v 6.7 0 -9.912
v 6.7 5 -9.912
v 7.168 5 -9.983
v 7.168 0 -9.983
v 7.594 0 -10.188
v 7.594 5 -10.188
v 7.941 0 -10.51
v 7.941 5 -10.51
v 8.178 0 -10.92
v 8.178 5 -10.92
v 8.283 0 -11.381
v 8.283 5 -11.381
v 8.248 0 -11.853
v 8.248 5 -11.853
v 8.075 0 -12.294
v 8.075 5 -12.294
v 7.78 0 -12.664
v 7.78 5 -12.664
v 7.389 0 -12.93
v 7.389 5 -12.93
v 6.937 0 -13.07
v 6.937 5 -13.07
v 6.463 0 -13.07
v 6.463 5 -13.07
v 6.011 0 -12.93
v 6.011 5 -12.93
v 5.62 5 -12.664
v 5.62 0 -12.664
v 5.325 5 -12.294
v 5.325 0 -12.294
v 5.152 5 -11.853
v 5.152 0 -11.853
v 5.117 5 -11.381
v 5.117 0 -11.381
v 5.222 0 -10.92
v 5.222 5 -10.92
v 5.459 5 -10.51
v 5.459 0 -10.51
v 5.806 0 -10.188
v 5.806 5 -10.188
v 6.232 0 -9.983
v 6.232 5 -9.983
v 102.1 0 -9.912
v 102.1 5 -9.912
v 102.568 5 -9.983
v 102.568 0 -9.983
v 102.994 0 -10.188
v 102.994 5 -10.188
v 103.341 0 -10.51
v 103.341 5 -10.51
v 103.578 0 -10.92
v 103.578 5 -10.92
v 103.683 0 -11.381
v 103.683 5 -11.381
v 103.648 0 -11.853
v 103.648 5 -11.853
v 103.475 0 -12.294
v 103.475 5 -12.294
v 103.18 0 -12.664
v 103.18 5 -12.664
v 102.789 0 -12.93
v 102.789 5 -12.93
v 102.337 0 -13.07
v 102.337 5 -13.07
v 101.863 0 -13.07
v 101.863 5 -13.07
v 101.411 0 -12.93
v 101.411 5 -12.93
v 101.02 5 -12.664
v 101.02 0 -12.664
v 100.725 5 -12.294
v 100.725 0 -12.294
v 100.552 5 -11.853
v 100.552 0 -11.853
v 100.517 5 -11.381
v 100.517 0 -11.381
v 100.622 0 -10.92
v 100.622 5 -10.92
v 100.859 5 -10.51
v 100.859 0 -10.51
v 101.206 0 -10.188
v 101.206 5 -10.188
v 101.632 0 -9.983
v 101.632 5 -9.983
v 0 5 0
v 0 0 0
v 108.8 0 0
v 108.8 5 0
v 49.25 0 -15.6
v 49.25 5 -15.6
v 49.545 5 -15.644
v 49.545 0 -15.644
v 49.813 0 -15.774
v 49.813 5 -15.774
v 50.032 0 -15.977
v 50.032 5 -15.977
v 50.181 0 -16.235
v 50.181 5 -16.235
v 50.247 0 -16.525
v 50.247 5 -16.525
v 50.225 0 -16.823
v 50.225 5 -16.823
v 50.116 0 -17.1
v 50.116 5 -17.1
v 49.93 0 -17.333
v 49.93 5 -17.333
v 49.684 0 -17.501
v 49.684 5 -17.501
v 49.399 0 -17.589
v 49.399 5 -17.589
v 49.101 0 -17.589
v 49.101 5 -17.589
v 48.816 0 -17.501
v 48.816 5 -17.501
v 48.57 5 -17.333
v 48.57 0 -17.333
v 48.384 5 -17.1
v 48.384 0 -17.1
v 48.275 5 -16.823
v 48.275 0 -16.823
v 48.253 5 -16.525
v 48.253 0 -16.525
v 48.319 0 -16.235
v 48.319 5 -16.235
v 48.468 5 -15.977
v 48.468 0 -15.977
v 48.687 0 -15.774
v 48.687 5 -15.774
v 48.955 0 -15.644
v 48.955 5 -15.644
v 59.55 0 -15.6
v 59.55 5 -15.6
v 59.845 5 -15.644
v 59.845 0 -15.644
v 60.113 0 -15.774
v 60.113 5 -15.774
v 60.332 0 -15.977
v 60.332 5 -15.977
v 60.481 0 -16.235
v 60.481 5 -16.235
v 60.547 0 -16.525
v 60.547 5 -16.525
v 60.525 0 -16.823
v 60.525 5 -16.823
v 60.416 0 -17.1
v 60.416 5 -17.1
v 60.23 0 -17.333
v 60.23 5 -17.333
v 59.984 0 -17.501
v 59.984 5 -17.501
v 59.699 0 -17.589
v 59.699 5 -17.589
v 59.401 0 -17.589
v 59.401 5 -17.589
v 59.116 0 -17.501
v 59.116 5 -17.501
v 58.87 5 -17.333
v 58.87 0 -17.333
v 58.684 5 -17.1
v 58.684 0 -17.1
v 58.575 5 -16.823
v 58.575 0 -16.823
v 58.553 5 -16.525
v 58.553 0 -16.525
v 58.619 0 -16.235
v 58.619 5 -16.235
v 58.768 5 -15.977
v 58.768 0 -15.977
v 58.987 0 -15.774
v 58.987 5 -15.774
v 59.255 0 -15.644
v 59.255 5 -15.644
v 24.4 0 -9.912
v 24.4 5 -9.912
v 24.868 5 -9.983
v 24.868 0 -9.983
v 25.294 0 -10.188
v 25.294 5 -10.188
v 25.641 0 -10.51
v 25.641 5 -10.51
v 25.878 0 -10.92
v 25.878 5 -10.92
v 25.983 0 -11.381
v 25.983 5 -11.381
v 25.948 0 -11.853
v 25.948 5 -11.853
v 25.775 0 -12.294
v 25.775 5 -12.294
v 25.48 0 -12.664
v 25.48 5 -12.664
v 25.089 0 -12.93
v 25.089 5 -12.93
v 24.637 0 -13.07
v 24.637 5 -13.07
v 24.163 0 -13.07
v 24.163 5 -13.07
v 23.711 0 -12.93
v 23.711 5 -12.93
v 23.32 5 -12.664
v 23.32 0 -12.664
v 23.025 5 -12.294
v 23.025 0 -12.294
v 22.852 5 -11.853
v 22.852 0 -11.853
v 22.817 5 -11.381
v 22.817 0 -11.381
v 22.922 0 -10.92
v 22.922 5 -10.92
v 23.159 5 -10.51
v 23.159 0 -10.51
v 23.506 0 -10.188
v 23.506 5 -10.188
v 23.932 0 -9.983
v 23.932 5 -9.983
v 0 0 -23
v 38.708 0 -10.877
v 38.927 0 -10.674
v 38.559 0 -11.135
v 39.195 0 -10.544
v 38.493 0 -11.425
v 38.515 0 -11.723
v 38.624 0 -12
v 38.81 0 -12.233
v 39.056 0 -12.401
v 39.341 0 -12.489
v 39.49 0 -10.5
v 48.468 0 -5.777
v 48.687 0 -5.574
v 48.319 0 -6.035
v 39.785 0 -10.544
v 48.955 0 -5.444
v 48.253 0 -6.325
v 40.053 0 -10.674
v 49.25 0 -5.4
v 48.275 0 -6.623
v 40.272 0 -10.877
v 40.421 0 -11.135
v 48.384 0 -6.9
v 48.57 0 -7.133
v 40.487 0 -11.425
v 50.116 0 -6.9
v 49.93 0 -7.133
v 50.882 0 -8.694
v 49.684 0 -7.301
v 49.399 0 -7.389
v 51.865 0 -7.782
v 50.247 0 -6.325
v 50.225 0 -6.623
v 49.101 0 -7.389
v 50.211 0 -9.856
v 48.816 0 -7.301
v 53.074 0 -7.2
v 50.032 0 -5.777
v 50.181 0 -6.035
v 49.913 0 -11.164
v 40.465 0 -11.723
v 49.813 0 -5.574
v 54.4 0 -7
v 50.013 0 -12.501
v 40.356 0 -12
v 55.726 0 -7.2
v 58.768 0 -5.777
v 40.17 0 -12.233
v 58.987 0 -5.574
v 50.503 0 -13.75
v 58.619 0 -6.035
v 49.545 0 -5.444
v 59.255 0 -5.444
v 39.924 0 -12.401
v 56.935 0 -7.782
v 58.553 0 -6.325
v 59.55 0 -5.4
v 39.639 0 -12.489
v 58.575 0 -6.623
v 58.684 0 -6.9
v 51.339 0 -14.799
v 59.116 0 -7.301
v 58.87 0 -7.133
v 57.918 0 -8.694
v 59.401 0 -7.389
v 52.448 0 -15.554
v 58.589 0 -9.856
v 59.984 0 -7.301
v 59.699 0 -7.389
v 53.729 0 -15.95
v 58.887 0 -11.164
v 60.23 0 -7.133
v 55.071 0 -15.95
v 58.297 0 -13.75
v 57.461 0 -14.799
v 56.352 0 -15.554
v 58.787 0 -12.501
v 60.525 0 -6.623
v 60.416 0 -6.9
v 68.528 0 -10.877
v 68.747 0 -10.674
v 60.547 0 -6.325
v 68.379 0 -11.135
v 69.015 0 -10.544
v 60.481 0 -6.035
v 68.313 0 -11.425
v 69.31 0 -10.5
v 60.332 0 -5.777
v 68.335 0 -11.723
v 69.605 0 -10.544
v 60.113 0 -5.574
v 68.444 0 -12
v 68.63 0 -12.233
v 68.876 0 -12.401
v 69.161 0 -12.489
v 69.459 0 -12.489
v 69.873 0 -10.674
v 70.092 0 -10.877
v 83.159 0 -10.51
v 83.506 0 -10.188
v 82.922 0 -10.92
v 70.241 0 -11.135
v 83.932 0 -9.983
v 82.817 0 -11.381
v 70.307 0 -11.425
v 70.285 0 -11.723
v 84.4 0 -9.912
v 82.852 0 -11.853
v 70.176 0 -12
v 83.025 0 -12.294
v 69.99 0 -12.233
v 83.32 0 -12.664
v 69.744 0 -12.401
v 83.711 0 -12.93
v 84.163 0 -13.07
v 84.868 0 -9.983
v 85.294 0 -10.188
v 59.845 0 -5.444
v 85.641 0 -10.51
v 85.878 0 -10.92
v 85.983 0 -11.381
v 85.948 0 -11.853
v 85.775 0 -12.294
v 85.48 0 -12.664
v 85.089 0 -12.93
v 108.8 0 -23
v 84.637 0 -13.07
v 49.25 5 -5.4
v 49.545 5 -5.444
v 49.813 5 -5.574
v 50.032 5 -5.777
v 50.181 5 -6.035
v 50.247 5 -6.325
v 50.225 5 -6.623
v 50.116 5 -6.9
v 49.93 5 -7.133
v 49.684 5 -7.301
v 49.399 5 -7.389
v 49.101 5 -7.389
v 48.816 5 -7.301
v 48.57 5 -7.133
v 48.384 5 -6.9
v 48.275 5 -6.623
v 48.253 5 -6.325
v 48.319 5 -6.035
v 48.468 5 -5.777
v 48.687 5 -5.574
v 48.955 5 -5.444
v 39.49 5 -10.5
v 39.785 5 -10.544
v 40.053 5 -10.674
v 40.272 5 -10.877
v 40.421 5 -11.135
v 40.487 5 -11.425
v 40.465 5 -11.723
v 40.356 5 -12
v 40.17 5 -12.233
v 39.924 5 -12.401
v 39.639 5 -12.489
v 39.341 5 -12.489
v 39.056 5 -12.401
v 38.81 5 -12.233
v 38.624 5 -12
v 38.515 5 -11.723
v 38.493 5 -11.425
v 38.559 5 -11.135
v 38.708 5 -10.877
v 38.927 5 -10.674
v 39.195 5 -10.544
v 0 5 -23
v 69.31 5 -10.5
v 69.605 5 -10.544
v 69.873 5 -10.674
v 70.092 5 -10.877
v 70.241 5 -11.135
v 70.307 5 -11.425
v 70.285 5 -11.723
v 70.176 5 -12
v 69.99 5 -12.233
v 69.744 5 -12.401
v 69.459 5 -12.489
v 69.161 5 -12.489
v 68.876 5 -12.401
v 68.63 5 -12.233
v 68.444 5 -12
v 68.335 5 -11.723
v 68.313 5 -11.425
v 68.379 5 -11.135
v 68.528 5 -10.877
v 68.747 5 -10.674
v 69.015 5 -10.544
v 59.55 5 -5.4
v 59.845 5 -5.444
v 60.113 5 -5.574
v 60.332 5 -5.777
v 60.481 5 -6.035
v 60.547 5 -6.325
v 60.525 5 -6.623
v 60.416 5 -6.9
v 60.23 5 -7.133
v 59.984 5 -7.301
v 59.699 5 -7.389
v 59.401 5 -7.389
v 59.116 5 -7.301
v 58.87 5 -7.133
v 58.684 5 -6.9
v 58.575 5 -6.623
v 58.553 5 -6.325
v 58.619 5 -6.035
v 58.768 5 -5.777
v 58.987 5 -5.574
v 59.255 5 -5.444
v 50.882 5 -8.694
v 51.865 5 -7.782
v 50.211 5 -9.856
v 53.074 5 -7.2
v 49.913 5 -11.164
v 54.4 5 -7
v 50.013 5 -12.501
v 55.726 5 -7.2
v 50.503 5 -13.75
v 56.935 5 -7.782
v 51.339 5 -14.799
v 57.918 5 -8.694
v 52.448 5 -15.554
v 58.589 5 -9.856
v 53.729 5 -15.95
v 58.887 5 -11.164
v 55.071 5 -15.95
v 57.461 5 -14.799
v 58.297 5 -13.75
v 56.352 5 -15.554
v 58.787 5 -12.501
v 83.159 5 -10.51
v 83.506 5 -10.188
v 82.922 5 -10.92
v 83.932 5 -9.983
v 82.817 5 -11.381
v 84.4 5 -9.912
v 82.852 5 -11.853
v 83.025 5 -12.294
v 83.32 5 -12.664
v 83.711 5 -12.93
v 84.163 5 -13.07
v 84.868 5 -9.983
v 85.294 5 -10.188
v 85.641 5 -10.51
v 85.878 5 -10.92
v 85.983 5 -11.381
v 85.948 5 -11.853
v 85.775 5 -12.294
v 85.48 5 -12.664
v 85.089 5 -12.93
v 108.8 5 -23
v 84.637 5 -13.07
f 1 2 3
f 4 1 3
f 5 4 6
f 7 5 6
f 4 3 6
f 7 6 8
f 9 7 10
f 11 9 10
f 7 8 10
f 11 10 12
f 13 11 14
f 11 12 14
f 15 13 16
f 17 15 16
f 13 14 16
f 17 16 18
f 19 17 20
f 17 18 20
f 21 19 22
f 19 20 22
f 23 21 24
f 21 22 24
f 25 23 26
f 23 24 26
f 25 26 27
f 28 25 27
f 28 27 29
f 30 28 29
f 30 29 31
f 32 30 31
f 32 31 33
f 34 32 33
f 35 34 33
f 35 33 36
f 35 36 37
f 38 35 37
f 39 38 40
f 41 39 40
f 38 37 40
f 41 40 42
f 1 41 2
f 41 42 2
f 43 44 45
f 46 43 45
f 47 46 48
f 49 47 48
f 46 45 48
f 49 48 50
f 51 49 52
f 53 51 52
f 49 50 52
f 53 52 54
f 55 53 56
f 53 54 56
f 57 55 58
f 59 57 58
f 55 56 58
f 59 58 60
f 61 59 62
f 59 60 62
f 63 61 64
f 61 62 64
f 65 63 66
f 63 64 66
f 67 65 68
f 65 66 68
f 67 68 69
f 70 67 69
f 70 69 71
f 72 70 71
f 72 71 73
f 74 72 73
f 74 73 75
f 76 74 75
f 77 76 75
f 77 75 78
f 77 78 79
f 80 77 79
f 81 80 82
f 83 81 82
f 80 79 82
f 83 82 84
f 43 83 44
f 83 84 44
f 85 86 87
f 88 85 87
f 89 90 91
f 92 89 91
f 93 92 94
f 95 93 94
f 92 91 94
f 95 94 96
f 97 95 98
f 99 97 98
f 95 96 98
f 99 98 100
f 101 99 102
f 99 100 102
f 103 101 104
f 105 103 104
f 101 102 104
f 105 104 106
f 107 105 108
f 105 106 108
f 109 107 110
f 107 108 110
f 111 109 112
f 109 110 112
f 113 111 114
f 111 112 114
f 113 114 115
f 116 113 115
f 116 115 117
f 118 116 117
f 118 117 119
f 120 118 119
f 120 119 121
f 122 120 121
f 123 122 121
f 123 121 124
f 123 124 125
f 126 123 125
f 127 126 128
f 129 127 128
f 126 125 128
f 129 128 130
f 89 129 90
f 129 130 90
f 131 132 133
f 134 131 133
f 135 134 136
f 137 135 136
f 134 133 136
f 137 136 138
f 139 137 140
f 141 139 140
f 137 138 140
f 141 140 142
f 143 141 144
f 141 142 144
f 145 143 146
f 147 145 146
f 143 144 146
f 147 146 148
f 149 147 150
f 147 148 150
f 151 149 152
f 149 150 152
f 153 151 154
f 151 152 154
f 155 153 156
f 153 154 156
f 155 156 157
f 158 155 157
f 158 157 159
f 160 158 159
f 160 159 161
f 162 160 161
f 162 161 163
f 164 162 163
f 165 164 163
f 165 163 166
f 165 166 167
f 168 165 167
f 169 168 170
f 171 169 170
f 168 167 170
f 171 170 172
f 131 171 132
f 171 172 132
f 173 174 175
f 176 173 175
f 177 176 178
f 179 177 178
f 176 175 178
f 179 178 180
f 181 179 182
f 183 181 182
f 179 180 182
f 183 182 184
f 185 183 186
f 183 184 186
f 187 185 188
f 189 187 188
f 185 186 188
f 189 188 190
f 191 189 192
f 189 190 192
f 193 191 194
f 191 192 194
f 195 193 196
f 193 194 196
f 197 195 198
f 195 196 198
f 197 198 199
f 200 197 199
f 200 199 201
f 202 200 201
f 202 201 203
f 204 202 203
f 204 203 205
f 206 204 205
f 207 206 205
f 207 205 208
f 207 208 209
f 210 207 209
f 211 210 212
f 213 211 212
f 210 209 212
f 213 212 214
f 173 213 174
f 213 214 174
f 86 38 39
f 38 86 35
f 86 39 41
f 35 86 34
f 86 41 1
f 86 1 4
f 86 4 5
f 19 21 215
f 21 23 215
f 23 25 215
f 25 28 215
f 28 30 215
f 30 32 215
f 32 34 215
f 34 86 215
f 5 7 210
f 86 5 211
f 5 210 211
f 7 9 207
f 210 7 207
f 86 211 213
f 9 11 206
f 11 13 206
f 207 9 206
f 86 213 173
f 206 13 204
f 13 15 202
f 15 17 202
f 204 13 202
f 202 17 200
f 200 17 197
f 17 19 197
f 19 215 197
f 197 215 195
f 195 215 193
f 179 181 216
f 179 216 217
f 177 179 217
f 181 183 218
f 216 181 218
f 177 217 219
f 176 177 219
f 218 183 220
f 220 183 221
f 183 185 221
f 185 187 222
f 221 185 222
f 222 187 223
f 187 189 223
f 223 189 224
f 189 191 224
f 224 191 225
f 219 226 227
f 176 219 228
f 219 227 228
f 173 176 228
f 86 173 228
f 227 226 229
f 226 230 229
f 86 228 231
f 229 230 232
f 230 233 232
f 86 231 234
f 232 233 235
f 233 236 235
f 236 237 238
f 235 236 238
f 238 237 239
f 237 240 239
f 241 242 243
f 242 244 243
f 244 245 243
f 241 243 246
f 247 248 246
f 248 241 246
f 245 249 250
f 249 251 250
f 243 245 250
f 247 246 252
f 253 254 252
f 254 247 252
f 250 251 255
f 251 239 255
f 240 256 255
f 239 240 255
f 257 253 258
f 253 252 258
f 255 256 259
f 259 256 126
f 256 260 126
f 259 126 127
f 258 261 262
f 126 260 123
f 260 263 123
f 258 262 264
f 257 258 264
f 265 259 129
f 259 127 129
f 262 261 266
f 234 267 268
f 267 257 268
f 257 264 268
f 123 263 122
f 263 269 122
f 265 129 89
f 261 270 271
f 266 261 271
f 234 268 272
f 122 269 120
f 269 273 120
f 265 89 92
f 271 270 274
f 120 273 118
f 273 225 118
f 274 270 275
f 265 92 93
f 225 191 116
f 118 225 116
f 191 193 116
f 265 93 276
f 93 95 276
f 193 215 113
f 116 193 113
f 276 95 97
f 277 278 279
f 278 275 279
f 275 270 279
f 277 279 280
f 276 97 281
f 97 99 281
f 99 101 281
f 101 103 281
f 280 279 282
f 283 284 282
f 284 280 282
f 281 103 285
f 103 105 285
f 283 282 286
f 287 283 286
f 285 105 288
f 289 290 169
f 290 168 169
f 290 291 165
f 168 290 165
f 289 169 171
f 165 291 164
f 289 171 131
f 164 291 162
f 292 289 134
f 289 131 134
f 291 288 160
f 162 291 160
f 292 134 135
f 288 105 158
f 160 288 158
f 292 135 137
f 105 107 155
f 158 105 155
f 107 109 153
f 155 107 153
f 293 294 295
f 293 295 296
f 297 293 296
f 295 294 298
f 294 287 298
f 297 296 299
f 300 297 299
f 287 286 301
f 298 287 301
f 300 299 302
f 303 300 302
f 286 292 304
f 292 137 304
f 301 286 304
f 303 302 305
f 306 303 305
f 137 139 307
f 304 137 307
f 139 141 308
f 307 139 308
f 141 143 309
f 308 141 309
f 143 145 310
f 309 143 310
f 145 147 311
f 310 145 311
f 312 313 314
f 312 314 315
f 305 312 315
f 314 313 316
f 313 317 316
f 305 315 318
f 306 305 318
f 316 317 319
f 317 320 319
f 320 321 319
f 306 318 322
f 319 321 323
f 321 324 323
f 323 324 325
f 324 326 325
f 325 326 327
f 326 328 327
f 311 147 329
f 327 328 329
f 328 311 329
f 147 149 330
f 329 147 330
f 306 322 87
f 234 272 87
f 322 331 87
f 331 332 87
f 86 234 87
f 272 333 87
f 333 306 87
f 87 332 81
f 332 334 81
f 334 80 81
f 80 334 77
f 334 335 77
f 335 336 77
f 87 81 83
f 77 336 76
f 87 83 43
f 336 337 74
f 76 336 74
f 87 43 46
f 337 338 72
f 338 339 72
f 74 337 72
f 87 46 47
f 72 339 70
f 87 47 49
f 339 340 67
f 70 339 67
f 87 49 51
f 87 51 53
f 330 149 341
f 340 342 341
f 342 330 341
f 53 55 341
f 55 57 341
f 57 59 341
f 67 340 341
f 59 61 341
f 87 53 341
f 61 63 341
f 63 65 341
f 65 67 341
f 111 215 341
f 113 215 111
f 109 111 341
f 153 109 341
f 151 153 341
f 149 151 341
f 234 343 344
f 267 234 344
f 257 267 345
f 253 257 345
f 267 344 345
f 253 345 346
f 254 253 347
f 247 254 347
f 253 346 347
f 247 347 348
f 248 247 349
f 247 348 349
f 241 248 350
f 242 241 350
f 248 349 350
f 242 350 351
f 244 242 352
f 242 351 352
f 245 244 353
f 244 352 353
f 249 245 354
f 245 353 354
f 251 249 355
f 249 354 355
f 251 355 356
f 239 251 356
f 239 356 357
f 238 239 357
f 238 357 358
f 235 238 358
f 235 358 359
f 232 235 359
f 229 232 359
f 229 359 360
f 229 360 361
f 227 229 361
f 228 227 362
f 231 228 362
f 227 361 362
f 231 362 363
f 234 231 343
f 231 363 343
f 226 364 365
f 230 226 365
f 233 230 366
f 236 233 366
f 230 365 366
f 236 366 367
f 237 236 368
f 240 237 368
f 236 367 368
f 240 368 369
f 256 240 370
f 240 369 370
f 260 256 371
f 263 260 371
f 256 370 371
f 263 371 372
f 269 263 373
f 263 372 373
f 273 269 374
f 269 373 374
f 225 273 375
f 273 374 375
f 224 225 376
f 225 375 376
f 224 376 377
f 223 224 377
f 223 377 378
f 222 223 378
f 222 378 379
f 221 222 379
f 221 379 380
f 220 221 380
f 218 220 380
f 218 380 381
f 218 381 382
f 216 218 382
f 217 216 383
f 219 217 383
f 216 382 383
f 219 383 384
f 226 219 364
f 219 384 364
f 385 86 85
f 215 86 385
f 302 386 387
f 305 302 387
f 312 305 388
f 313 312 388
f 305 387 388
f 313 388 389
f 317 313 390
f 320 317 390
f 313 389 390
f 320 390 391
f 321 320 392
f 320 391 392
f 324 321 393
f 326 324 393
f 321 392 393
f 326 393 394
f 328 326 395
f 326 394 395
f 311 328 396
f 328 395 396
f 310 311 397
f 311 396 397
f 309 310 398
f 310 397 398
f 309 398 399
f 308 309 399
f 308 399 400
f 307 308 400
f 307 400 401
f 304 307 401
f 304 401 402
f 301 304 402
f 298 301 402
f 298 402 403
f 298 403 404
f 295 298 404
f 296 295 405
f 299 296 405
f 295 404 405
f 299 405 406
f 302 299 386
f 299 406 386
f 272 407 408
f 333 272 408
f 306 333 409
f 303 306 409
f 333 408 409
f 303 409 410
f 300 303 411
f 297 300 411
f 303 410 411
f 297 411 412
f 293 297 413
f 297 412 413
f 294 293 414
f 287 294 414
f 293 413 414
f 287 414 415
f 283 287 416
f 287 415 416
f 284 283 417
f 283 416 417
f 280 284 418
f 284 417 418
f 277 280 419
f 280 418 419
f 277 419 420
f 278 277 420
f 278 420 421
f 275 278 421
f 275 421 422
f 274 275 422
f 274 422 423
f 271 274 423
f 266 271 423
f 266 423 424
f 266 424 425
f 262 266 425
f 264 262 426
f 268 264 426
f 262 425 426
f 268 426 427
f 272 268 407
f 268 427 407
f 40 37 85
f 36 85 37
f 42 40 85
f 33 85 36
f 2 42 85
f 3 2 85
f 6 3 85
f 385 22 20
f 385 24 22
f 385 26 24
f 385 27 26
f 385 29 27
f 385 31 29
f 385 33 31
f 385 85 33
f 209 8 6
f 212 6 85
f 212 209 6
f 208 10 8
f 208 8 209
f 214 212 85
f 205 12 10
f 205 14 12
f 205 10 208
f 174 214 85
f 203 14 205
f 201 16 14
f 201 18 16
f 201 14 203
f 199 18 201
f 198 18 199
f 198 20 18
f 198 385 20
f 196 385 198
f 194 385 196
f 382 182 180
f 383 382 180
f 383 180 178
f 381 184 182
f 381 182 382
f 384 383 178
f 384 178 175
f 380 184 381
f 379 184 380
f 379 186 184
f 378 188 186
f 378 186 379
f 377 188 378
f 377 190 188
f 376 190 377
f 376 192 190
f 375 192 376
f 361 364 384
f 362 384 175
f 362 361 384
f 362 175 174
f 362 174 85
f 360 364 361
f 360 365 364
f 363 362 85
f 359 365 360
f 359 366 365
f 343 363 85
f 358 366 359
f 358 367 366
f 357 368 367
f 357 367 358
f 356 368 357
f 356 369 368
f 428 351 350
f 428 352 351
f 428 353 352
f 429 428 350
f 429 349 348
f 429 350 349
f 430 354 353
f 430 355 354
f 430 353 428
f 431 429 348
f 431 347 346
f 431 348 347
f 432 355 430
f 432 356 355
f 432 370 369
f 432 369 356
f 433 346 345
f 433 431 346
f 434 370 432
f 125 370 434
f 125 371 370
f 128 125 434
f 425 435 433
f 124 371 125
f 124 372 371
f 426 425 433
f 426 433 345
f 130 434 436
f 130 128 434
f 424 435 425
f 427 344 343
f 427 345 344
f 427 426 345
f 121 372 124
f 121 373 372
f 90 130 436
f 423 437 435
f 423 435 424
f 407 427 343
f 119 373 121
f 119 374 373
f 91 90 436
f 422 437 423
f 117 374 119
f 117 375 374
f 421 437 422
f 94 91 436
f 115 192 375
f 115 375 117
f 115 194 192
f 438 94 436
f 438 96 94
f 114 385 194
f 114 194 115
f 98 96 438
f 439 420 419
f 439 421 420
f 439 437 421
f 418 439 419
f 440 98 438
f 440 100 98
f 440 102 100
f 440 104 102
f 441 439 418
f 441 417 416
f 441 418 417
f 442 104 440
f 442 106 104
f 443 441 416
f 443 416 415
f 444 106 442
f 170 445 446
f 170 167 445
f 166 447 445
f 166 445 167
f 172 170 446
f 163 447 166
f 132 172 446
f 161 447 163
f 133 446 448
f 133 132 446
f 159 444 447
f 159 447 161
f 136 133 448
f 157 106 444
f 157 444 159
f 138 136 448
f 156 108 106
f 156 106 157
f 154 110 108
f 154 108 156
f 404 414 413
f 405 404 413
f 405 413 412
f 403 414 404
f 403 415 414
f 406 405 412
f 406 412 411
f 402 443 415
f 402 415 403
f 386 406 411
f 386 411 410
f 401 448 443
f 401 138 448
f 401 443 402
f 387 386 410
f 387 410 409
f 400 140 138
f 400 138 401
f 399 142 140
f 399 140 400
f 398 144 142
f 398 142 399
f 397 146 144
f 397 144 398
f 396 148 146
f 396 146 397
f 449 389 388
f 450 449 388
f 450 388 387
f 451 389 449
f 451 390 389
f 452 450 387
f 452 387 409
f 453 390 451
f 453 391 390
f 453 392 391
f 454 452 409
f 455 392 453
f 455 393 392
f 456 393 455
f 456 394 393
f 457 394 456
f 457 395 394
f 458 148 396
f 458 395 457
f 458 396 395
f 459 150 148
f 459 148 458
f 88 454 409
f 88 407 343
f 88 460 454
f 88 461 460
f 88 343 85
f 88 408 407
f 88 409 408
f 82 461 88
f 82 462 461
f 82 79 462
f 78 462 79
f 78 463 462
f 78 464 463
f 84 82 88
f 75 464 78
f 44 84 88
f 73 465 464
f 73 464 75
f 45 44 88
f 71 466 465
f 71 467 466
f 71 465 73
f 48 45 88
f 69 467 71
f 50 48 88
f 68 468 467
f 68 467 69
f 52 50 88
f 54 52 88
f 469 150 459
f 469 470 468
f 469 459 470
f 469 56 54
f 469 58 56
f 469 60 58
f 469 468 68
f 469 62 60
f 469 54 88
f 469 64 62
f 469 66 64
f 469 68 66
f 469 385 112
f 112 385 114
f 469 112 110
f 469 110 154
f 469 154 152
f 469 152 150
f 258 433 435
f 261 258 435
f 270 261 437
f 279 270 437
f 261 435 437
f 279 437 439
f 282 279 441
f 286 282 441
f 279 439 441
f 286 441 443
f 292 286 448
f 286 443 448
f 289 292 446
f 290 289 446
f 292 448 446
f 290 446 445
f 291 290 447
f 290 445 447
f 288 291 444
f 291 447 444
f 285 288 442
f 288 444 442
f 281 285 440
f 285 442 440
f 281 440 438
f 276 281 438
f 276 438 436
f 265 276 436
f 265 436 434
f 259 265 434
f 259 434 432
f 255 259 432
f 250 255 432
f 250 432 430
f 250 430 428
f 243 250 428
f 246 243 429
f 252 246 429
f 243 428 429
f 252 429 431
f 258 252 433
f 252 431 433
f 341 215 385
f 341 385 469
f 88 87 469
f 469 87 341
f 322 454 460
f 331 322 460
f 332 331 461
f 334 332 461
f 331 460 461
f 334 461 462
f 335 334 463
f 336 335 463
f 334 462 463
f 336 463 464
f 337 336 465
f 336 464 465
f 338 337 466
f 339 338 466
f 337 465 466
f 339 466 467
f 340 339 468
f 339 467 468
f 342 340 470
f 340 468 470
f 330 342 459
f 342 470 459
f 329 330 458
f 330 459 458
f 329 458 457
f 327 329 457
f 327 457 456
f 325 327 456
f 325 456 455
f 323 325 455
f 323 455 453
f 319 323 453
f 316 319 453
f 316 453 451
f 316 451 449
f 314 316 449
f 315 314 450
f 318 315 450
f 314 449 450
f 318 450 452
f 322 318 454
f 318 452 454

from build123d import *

# Parameters (mm, degrees)
SKETCH1_W                 = 108.8
SKETCH1_H                 = 23
MOUNT_BASE_DEPTH          = 5
SKETCH2_R                 = 1
SKETCH2_R_2               = 4.5
BRACKET_SCREW_HOLES_DEPTH = 5
SKETCH3_R                 = 1.5875
ANTENNA_SCREW_HOLES_DEPTH = 5


with BuildPart() as part:
    # Sketch1 → Mount Base (new body)
    with BuildSketch(Plane(origin=(0, 0, 0), x_dir=(1, 0, 0), z_dir=(0, 1, 0))):
        with Locations((54.4, 11.5)):
            Rectangle(SKETCH1_W, SKETCH1_H)
    extrude(amount=MOUNT_BASE_DEPTH)

    # Sketch2 → Bracket Screw Holes (cut)
    with BuildSketch(Plane(origin=(0, 5, 0), x_dir=(1, 0, 0), z_dir=(0, 1, 0))):
        with Locations(Location((59.55, 16.6, 0), (0, 0, 270))):
            Circle(SKETCH2_R)
        with Locations(Location((59.55, 6.4, 0), (0, 0, 270))):
            Circle(SKETCH2_R)
        with Locations(Location((49.25, 6.4, 0), (0, 0, 270))):
            Circle(SKETCH2_R)
        with Locations(Location((49.25, 16.6, 0), (0, 0, 270))):
            Circle(SKETCH2_R)
        with Locations(Location((69.31, 11.5, 0), (0, 0, 270))):
            Circle(SKETCH2_R)
        with Locations(Location((39.49, 11.5, 0), (0, 0, 270))):
            Circle(SKETCH2_R)
        with Locations(Location((54.4, 11.5, 0), (0, 0, 270))):
            Circle(SKETCH2_R_2)
    extrude(amount=-BRACKET_SCREW_HOLES_DEPTH, mode=Mode.SUBTRACT)

    # Sketch3 → Antenna Screw Holes (cut)
    with BuildSketch(Plane(origin=(0, 5, 0), x_dir=(1, 0, 0), z_dir=(0, 1, 0))):
        with Locations(Location((6.7, 11.5, 0), (0, 0, 270))):
            Circle(SKETCH3_R)
        with Locations(Location((24.4, 11.5, 0), (0, 0, 270))):
            Circle(SKETCH3_R)
        with Locations(Location((84.4, 11.5, 0), (0, 0, 270))):
            Circle(SKETCH3_R)
        with Locations(Location((102.1, 11.5, 0), (0, 0, 270))):
            Circle(SKETCH3_R)
    extrude(amount=-ANTENNA_SCREW_HOLES_DEPTH, mode=Mode.SUBTRACT)


solid = part.part
